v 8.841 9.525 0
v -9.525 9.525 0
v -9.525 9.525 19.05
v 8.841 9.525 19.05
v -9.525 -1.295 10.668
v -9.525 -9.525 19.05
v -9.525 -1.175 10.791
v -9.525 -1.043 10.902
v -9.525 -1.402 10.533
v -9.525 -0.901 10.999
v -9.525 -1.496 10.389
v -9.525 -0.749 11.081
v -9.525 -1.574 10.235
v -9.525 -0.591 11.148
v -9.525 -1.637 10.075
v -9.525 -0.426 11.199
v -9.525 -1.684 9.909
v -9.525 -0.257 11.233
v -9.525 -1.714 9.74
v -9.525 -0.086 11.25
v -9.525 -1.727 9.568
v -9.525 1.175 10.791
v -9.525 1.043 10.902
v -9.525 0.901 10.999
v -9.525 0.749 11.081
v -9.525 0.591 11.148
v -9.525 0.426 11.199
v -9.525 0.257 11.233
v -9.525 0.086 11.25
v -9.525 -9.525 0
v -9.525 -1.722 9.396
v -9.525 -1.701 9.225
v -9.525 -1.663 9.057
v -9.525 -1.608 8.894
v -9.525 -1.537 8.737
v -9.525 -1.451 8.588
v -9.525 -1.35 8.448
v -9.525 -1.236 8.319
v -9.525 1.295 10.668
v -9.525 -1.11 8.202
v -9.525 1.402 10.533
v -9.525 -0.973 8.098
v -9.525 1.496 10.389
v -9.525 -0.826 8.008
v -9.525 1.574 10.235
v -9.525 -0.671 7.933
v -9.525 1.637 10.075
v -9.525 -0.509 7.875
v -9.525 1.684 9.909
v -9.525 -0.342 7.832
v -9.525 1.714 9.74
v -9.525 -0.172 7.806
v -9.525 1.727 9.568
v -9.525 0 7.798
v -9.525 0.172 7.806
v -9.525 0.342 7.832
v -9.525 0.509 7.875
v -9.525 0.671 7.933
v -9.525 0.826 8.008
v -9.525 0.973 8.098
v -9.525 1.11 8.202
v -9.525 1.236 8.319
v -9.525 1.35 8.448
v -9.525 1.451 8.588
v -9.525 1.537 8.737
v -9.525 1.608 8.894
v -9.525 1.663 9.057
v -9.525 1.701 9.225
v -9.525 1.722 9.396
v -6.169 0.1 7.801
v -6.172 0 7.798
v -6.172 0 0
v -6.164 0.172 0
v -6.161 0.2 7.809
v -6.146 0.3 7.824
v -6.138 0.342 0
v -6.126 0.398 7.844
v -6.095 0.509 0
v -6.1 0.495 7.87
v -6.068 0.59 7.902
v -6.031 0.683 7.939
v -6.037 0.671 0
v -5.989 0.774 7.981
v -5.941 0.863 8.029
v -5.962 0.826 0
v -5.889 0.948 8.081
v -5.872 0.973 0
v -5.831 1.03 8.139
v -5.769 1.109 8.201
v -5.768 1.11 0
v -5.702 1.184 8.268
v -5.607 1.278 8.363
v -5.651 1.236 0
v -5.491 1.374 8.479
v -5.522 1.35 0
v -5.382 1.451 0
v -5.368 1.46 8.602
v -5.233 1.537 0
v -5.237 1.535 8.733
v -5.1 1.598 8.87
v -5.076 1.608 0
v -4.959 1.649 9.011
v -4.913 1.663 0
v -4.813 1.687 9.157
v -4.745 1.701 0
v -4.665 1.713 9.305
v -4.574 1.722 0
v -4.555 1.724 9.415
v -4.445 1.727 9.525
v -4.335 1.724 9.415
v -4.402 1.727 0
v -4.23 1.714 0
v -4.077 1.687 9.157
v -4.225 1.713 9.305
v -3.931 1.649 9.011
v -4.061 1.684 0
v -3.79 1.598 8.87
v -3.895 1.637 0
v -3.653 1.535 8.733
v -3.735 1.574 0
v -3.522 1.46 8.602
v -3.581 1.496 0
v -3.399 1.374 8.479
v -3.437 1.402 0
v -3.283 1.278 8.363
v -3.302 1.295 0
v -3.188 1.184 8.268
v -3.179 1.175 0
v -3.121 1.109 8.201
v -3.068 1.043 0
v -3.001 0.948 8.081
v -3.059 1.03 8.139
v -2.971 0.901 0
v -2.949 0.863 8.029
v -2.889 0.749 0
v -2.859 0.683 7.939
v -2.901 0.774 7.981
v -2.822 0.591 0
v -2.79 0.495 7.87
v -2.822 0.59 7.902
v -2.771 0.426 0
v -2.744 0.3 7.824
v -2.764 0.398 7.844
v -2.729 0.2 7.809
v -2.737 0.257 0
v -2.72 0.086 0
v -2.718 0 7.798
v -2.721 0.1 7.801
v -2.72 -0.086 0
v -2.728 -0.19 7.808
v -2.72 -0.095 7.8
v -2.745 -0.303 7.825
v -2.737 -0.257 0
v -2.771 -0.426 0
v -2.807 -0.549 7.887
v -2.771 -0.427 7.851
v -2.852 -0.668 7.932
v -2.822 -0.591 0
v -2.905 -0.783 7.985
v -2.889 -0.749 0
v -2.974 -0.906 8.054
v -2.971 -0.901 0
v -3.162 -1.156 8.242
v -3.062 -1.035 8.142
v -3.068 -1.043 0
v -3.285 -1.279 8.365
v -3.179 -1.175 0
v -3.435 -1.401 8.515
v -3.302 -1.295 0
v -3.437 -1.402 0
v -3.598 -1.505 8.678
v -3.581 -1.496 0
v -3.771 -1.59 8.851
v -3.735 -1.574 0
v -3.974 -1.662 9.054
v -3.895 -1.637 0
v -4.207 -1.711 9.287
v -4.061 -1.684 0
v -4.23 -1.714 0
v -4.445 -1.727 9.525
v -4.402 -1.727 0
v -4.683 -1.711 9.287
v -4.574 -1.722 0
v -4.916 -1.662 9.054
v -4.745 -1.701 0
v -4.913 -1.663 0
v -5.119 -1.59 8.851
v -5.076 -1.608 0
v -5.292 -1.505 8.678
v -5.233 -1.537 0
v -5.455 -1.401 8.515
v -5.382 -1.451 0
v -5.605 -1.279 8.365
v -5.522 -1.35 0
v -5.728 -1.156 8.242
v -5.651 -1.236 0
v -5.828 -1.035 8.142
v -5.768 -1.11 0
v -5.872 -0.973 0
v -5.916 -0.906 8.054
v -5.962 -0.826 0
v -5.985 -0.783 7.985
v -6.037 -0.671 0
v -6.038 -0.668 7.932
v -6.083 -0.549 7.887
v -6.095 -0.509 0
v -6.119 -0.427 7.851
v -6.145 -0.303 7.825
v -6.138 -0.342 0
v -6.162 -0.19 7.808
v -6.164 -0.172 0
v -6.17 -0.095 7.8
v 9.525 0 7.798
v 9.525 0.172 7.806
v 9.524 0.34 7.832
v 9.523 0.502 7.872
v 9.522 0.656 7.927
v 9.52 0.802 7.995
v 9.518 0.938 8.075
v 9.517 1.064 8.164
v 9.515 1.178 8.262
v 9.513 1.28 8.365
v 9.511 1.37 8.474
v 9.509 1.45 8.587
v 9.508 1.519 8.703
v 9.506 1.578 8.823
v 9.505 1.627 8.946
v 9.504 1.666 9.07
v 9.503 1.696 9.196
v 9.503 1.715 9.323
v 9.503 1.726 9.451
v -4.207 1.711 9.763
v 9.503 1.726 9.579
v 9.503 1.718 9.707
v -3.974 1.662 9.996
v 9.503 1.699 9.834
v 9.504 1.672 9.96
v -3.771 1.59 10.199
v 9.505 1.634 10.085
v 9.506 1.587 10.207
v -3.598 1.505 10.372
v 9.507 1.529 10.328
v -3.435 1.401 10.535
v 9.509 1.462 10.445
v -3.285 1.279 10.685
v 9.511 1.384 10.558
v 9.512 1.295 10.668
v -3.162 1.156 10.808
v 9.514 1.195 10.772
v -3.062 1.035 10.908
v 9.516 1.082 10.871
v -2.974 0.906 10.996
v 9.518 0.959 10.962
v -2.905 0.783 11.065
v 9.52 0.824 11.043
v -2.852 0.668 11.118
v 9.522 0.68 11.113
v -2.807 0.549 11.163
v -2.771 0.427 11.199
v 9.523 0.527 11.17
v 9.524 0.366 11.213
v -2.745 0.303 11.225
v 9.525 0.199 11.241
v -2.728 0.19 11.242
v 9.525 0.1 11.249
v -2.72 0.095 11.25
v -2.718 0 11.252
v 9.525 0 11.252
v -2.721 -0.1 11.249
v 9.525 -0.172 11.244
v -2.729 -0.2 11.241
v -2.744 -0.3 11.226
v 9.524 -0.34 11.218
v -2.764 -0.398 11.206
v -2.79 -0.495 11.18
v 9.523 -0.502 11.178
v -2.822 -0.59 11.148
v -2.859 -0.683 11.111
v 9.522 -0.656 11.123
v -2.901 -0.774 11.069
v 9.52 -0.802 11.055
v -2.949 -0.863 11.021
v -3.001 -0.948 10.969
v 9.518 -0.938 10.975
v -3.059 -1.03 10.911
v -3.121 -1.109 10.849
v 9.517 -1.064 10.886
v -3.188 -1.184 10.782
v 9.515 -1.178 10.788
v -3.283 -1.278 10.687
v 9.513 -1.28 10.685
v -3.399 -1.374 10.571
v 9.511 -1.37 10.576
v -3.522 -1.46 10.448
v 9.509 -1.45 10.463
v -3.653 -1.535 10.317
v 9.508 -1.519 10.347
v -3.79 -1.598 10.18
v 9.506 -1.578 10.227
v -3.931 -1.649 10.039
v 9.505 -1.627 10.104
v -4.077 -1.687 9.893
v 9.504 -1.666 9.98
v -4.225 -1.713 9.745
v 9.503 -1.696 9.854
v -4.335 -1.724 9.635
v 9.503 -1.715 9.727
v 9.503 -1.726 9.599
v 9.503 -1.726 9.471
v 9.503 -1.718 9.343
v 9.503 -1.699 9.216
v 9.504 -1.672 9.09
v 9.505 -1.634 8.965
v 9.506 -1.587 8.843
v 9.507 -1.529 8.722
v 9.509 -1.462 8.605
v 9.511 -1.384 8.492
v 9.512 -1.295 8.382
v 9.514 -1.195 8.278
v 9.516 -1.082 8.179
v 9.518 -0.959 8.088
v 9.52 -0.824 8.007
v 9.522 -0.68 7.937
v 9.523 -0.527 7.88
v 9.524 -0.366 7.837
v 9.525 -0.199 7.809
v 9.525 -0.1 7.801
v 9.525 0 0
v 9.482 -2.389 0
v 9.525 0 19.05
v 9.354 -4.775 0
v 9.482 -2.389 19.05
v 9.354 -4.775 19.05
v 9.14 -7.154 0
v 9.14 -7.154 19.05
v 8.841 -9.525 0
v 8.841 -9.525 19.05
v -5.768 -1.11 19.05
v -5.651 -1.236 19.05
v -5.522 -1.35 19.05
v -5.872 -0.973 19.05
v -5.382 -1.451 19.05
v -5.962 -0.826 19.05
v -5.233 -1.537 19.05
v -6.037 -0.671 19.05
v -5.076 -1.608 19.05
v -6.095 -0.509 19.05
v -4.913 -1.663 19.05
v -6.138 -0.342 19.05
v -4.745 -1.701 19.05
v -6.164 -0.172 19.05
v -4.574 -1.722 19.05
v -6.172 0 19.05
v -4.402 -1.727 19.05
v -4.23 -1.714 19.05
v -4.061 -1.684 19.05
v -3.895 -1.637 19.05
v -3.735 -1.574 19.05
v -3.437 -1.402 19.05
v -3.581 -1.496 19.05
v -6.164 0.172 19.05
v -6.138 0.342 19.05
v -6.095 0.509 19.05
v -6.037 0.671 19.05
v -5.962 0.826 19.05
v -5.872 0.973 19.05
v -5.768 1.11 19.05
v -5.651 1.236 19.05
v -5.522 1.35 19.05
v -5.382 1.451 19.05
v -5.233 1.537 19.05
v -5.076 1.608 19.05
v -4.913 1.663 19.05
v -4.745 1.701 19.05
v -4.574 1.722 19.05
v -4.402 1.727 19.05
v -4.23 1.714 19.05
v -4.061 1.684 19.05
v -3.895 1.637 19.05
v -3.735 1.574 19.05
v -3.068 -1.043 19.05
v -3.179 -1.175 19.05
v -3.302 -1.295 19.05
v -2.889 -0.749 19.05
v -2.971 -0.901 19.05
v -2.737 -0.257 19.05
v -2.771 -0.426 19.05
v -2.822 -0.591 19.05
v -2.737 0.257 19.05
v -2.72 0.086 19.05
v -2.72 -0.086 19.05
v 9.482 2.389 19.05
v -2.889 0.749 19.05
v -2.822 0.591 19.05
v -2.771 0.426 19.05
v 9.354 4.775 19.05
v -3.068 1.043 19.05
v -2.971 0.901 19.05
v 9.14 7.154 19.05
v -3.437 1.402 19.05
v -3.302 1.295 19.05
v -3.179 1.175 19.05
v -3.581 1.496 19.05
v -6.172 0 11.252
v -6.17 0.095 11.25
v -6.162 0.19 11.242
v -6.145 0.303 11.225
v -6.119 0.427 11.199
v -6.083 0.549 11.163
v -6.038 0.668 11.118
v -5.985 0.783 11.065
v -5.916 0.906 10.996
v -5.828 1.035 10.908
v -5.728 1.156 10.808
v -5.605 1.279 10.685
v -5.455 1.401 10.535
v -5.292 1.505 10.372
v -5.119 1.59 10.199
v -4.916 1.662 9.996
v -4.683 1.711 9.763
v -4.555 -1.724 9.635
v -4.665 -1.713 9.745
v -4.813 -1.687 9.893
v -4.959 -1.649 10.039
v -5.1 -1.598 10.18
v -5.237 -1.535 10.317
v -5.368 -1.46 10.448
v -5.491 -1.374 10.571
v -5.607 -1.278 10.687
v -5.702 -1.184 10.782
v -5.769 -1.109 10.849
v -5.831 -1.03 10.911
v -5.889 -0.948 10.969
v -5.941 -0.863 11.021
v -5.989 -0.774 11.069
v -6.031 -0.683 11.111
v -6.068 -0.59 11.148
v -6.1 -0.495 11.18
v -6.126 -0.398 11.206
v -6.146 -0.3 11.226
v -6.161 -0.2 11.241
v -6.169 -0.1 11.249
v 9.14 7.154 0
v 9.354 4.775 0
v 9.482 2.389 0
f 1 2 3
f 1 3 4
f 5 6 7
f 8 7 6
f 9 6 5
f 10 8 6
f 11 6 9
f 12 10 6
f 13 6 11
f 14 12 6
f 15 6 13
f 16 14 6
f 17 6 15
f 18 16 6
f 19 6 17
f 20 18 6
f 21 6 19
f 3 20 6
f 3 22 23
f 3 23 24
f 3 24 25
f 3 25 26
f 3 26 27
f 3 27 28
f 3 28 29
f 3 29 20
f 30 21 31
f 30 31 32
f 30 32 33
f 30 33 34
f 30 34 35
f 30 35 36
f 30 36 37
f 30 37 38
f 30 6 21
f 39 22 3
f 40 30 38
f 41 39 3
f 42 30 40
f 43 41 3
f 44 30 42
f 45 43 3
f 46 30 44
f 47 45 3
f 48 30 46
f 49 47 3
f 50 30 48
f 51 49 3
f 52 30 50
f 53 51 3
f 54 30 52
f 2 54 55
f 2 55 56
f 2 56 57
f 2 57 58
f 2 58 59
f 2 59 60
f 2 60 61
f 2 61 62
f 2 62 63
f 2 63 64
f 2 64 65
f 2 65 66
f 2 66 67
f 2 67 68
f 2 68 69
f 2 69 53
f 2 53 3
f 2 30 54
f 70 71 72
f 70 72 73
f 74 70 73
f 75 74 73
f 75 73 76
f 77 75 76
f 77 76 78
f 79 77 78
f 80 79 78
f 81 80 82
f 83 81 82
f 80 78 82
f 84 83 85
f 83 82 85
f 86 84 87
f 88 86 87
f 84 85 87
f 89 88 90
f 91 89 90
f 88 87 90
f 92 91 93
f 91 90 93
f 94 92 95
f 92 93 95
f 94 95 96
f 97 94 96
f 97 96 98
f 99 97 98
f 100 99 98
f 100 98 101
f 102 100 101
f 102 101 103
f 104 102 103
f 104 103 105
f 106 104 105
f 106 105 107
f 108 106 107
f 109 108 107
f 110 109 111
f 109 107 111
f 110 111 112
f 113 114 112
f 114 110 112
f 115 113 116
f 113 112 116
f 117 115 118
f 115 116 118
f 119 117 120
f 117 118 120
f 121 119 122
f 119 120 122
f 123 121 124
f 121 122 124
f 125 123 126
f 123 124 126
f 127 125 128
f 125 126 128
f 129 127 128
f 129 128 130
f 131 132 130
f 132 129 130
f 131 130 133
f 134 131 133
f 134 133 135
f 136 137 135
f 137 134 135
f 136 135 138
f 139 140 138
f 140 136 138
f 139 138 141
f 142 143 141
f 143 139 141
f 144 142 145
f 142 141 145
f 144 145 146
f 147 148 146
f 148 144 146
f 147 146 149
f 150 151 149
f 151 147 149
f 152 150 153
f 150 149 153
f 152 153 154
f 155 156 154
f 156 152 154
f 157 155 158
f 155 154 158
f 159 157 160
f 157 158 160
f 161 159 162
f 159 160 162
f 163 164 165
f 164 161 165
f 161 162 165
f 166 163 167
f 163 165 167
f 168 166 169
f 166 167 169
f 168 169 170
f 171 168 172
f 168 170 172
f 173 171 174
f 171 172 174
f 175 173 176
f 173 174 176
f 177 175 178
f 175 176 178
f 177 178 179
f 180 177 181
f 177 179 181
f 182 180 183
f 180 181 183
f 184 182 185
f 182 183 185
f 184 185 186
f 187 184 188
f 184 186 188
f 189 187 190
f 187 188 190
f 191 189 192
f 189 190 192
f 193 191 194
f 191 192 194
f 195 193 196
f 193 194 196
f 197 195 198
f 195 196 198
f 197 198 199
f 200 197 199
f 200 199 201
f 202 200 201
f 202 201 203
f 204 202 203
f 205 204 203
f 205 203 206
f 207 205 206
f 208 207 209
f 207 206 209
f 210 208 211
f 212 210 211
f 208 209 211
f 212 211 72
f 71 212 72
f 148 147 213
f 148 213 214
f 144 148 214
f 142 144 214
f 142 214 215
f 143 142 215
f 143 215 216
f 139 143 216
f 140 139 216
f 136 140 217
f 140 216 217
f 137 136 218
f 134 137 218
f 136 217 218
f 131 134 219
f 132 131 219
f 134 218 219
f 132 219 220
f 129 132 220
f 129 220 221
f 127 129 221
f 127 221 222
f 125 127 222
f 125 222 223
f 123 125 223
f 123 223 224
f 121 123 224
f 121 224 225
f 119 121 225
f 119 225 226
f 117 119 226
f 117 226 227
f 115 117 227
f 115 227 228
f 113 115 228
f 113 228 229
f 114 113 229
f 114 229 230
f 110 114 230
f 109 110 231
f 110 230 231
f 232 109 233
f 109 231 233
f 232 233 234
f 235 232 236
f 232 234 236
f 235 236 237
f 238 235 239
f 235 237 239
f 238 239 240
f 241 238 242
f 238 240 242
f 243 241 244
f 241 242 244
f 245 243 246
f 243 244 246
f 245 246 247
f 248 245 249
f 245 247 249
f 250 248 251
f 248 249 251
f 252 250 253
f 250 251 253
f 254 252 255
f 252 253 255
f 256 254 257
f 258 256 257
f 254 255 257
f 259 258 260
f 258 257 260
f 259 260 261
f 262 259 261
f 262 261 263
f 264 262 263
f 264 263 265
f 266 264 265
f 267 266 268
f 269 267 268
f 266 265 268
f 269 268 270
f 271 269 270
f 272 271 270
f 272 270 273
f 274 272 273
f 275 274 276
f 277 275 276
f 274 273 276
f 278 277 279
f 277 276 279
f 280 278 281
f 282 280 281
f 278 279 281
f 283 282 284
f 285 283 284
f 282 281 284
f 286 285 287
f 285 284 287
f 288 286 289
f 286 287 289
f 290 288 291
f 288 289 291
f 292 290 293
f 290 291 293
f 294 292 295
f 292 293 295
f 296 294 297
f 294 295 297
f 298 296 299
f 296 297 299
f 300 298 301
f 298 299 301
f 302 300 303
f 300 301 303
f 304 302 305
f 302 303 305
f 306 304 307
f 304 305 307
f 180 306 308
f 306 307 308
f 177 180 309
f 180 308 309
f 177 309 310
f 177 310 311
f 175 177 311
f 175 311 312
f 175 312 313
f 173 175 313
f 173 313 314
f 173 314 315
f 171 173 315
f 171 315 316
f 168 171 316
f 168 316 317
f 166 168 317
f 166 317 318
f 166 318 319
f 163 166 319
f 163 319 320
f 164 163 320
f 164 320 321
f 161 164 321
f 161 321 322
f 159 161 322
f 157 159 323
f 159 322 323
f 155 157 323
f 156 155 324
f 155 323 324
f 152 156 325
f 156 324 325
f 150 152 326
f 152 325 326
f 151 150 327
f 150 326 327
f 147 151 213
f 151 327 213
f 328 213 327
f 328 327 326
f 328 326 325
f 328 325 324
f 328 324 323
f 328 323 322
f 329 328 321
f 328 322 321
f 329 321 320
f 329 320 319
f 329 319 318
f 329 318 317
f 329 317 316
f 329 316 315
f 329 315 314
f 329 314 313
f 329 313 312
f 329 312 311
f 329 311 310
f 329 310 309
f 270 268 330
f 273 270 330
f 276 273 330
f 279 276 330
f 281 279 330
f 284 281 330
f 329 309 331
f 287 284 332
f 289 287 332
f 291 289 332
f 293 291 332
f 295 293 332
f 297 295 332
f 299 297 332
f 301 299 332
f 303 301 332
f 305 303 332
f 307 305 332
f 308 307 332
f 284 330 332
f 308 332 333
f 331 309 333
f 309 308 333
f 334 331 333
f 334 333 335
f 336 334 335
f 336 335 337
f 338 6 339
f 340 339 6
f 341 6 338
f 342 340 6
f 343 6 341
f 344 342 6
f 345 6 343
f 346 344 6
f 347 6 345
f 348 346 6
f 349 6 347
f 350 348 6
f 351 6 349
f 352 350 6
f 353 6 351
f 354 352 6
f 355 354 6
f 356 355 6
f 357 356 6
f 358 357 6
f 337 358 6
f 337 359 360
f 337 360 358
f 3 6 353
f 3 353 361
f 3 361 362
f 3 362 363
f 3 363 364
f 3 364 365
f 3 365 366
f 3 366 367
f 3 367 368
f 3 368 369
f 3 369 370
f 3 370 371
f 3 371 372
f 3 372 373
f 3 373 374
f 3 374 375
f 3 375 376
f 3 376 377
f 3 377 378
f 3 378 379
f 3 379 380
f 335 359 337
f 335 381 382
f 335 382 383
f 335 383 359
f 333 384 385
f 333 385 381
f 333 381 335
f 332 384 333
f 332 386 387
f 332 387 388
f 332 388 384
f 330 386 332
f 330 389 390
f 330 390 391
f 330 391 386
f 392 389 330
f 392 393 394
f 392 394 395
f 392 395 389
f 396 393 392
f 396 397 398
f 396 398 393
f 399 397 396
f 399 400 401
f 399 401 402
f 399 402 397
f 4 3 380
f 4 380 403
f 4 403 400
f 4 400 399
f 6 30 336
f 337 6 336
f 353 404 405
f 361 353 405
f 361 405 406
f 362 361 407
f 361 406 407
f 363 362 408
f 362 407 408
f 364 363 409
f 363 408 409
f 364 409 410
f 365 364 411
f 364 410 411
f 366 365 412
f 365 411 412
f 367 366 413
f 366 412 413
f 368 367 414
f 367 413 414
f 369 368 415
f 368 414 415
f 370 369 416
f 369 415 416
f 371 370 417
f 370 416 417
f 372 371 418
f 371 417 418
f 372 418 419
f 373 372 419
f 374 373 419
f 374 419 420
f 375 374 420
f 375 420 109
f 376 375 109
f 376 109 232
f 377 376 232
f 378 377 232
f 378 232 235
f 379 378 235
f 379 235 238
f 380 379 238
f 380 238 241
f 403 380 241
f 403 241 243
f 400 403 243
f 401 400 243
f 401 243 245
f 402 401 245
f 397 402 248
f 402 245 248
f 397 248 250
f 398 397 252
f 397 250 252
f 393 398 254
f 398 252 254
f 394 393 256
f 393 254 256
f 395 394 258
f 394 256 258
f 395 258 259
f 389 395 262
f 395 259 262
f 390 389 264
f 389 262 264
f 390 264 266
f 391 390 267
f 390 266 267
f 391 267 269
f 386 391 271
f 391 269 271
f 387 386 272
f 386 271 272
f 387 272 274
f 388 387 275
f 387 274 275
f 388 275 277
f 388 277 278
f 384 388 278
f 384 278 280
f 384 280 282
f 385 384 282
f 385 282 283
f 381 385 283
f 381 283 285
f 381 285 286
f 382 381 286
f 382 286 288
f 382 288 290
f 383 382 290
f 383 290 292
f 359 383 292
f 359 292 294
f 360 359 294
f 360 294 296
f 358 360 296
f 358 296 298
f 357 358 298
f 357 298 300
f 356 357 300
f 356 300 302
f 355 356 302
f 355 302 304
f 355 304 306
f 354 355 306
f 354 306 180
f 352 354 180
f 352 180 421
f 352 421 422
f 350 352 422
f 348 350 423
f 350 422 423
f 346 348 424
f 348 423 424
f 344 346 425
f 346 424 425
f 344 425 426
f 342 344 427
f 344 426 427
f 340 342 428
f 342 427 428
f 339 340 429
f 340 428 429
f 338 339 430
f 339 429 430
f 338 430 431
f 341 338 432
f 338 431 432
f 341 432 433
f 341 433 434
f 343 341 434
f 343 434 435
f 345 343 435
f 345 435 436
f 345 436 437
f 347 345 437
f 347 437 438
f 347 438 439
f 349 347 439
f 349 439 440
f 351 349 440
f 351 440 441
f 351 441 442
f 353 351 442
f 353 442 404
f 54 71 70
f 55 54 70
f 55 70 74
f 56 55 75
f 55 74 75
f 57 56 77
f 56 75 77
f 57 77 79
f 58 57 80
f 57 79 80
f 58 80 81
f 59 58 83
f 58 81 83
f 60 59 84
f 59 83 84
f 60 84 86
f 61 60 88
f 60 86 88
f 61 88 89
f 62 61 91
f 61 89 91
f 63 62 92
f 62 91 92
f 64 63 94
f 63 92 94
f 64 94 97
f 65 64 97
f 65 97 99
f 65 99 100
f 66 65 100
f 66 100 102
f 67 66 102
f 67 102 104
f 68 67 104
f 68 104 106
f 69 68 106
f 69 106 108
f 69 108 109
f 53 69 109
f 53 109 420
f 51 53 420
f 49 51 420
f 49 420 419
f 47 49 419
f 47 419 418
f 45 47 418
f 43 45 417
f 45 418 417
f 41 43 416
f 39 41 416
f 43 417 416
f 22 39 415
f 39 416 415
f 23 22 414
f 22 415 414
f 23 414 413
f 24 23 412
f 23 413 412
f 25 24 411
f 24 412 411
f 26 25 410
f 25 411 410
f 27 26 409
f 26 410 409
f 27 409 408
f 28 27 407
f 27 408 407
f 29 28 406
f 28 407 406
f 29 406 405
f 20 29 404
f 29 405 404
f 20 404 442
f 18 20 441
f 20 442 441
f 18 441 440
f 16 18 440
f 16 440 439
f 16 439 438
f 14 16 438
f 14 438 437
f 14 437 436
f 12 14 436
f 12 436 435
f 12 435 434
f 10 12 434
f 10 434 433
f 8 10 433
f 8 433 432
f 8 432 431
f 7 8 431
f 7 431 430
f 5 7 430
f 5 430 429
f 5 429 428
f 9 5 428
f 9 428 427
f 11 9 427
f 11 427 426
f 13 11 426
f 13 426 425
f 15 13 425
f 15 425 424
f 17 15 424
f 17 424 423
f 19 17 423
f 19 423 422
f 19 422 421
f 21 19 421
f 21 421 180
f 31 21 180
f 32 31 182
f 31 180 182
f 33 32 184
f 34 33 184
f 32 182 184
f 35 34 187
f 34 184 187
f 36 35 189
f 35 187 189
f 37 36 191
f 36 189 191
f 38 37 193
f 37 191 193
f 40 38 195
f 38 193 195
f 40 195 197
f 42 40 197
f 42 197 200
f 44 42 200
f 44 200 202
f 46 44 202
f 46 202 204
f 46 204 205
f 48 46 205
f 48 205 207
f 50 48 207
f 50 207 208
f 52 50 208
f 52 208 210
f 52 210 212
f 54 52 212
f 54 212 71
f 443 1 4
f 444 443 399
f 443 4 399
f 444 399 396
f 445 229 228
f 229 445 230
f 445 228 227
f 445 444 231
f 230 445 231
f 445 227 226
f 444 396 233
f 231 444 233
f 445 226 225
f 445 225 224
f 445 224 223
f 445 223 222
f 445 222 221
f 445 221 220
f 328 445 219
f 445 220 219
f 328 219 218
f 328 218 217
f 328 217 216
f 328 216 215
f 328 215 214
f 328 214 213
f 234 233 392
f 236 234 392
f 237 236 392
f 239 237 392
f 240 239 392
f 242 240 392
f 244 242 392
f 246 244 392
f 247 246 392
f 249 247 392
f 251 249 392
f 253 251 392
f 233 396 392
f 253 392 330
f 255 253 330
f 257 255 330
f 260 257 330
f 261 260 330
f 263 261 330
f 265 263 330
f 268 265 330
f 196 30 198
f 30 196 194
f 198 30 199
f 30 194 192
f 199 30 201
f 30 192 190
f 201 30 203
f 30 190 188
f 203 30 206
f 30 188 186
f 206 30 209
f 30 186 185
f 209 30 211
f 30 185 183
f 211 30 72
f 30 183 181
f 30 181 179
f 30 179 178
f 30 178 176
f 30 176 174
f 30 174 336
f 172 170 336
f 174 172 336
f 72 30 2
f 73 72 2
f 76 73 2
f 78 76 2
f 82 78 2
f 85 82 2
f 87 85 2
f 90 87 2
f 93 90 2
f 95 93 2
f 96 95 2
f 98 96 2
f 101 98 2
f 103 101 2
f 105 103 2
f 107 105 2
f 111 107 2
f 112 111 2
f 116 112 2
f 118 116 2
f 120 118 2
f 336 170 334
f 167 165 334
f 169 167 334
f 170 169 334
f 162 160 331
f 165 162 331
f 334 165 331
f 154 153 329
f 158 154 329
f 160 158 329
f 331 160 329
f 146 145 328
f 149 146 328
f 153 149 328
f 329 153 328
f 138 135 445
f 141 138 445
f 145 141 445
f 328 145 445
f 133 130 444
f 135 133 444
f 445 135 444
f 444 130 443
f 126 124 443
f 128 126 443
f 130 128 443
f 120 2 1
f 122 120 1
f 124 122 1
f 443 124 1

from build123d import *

# Parameters (mm, degrees)
SKETCH1_W                   = 19.05
SKETCH1_H                   = 19.05
EXTRUDE1_DEPTH              = 19.05
F_29_0_136_DIAMETER_HOLE1_D = 3.4544
EXTRUDE2_DEPTH              = 1
EXTRUDE2_DEPTH_BACK         = 20.05
F_29_0_136_DIAMETER_HOLE3_D = 3.4544


with BuildPart() as part:
    # Sketch1 → Extrude1 (new body)
    with BuildSketch(Plane.XY):
        Rectangle(SKETCH1_W, SKETCH1_H)
    extrude(amount=EXTRUDE1_DEPTH)

    # #29 (0.136) Diameter Hole1 (through all)
    with Locations(Plane.ZY.offset(9.525)):
        with Locations((9.525, 0)):
            Hole(F_29_0_136_DIAMETER_HOLE1_D / 2)

    # Sketch7 → Extrude2 (cut, two sides)
    with BuildSketch(Plane.XY.offset(19.05)) as extrude2_sk:
        with BuildLine():
            Line((9.525, -9.525), (9.525, 0))
            ThreePointArc((9.525, 0), (9.353814185, -4.774759033), (8.841135768, -9.525))
            Line((8.841135768, -9.525), (9.525, -9.525))
        make_face()
        with BuildLine():
            ThreePointArc((8.841135768, 9.525), (9.353814185, 4.774759033), (9.525, 0))
            Line((9.525, 0), (9.525, 9.525))
            Line((9.525, 9.525), (8.841135768, 9.525))
        make_face()
    extrude(amount=EXTRUDE2_DEPTH, mode=Mode.SUBTRACT)
    extrude(extrude2_sk.sketch, amount=-EXTRUDE2_DEPTH_BACK, mode=Mode.SUBTRACT)

    # #29 (0.136) Diameter Hole3 (through all)
    with Locations(Plane(origin=(-4.445, 0, 19.05), x_dir=(1, 0, 0), z_dir=(0, 0, 1))):
        with Locations((0, 0)):
            Hole(F_29_0_136_DIAMETER_HOLE3_D / 2)


solid = part.part
